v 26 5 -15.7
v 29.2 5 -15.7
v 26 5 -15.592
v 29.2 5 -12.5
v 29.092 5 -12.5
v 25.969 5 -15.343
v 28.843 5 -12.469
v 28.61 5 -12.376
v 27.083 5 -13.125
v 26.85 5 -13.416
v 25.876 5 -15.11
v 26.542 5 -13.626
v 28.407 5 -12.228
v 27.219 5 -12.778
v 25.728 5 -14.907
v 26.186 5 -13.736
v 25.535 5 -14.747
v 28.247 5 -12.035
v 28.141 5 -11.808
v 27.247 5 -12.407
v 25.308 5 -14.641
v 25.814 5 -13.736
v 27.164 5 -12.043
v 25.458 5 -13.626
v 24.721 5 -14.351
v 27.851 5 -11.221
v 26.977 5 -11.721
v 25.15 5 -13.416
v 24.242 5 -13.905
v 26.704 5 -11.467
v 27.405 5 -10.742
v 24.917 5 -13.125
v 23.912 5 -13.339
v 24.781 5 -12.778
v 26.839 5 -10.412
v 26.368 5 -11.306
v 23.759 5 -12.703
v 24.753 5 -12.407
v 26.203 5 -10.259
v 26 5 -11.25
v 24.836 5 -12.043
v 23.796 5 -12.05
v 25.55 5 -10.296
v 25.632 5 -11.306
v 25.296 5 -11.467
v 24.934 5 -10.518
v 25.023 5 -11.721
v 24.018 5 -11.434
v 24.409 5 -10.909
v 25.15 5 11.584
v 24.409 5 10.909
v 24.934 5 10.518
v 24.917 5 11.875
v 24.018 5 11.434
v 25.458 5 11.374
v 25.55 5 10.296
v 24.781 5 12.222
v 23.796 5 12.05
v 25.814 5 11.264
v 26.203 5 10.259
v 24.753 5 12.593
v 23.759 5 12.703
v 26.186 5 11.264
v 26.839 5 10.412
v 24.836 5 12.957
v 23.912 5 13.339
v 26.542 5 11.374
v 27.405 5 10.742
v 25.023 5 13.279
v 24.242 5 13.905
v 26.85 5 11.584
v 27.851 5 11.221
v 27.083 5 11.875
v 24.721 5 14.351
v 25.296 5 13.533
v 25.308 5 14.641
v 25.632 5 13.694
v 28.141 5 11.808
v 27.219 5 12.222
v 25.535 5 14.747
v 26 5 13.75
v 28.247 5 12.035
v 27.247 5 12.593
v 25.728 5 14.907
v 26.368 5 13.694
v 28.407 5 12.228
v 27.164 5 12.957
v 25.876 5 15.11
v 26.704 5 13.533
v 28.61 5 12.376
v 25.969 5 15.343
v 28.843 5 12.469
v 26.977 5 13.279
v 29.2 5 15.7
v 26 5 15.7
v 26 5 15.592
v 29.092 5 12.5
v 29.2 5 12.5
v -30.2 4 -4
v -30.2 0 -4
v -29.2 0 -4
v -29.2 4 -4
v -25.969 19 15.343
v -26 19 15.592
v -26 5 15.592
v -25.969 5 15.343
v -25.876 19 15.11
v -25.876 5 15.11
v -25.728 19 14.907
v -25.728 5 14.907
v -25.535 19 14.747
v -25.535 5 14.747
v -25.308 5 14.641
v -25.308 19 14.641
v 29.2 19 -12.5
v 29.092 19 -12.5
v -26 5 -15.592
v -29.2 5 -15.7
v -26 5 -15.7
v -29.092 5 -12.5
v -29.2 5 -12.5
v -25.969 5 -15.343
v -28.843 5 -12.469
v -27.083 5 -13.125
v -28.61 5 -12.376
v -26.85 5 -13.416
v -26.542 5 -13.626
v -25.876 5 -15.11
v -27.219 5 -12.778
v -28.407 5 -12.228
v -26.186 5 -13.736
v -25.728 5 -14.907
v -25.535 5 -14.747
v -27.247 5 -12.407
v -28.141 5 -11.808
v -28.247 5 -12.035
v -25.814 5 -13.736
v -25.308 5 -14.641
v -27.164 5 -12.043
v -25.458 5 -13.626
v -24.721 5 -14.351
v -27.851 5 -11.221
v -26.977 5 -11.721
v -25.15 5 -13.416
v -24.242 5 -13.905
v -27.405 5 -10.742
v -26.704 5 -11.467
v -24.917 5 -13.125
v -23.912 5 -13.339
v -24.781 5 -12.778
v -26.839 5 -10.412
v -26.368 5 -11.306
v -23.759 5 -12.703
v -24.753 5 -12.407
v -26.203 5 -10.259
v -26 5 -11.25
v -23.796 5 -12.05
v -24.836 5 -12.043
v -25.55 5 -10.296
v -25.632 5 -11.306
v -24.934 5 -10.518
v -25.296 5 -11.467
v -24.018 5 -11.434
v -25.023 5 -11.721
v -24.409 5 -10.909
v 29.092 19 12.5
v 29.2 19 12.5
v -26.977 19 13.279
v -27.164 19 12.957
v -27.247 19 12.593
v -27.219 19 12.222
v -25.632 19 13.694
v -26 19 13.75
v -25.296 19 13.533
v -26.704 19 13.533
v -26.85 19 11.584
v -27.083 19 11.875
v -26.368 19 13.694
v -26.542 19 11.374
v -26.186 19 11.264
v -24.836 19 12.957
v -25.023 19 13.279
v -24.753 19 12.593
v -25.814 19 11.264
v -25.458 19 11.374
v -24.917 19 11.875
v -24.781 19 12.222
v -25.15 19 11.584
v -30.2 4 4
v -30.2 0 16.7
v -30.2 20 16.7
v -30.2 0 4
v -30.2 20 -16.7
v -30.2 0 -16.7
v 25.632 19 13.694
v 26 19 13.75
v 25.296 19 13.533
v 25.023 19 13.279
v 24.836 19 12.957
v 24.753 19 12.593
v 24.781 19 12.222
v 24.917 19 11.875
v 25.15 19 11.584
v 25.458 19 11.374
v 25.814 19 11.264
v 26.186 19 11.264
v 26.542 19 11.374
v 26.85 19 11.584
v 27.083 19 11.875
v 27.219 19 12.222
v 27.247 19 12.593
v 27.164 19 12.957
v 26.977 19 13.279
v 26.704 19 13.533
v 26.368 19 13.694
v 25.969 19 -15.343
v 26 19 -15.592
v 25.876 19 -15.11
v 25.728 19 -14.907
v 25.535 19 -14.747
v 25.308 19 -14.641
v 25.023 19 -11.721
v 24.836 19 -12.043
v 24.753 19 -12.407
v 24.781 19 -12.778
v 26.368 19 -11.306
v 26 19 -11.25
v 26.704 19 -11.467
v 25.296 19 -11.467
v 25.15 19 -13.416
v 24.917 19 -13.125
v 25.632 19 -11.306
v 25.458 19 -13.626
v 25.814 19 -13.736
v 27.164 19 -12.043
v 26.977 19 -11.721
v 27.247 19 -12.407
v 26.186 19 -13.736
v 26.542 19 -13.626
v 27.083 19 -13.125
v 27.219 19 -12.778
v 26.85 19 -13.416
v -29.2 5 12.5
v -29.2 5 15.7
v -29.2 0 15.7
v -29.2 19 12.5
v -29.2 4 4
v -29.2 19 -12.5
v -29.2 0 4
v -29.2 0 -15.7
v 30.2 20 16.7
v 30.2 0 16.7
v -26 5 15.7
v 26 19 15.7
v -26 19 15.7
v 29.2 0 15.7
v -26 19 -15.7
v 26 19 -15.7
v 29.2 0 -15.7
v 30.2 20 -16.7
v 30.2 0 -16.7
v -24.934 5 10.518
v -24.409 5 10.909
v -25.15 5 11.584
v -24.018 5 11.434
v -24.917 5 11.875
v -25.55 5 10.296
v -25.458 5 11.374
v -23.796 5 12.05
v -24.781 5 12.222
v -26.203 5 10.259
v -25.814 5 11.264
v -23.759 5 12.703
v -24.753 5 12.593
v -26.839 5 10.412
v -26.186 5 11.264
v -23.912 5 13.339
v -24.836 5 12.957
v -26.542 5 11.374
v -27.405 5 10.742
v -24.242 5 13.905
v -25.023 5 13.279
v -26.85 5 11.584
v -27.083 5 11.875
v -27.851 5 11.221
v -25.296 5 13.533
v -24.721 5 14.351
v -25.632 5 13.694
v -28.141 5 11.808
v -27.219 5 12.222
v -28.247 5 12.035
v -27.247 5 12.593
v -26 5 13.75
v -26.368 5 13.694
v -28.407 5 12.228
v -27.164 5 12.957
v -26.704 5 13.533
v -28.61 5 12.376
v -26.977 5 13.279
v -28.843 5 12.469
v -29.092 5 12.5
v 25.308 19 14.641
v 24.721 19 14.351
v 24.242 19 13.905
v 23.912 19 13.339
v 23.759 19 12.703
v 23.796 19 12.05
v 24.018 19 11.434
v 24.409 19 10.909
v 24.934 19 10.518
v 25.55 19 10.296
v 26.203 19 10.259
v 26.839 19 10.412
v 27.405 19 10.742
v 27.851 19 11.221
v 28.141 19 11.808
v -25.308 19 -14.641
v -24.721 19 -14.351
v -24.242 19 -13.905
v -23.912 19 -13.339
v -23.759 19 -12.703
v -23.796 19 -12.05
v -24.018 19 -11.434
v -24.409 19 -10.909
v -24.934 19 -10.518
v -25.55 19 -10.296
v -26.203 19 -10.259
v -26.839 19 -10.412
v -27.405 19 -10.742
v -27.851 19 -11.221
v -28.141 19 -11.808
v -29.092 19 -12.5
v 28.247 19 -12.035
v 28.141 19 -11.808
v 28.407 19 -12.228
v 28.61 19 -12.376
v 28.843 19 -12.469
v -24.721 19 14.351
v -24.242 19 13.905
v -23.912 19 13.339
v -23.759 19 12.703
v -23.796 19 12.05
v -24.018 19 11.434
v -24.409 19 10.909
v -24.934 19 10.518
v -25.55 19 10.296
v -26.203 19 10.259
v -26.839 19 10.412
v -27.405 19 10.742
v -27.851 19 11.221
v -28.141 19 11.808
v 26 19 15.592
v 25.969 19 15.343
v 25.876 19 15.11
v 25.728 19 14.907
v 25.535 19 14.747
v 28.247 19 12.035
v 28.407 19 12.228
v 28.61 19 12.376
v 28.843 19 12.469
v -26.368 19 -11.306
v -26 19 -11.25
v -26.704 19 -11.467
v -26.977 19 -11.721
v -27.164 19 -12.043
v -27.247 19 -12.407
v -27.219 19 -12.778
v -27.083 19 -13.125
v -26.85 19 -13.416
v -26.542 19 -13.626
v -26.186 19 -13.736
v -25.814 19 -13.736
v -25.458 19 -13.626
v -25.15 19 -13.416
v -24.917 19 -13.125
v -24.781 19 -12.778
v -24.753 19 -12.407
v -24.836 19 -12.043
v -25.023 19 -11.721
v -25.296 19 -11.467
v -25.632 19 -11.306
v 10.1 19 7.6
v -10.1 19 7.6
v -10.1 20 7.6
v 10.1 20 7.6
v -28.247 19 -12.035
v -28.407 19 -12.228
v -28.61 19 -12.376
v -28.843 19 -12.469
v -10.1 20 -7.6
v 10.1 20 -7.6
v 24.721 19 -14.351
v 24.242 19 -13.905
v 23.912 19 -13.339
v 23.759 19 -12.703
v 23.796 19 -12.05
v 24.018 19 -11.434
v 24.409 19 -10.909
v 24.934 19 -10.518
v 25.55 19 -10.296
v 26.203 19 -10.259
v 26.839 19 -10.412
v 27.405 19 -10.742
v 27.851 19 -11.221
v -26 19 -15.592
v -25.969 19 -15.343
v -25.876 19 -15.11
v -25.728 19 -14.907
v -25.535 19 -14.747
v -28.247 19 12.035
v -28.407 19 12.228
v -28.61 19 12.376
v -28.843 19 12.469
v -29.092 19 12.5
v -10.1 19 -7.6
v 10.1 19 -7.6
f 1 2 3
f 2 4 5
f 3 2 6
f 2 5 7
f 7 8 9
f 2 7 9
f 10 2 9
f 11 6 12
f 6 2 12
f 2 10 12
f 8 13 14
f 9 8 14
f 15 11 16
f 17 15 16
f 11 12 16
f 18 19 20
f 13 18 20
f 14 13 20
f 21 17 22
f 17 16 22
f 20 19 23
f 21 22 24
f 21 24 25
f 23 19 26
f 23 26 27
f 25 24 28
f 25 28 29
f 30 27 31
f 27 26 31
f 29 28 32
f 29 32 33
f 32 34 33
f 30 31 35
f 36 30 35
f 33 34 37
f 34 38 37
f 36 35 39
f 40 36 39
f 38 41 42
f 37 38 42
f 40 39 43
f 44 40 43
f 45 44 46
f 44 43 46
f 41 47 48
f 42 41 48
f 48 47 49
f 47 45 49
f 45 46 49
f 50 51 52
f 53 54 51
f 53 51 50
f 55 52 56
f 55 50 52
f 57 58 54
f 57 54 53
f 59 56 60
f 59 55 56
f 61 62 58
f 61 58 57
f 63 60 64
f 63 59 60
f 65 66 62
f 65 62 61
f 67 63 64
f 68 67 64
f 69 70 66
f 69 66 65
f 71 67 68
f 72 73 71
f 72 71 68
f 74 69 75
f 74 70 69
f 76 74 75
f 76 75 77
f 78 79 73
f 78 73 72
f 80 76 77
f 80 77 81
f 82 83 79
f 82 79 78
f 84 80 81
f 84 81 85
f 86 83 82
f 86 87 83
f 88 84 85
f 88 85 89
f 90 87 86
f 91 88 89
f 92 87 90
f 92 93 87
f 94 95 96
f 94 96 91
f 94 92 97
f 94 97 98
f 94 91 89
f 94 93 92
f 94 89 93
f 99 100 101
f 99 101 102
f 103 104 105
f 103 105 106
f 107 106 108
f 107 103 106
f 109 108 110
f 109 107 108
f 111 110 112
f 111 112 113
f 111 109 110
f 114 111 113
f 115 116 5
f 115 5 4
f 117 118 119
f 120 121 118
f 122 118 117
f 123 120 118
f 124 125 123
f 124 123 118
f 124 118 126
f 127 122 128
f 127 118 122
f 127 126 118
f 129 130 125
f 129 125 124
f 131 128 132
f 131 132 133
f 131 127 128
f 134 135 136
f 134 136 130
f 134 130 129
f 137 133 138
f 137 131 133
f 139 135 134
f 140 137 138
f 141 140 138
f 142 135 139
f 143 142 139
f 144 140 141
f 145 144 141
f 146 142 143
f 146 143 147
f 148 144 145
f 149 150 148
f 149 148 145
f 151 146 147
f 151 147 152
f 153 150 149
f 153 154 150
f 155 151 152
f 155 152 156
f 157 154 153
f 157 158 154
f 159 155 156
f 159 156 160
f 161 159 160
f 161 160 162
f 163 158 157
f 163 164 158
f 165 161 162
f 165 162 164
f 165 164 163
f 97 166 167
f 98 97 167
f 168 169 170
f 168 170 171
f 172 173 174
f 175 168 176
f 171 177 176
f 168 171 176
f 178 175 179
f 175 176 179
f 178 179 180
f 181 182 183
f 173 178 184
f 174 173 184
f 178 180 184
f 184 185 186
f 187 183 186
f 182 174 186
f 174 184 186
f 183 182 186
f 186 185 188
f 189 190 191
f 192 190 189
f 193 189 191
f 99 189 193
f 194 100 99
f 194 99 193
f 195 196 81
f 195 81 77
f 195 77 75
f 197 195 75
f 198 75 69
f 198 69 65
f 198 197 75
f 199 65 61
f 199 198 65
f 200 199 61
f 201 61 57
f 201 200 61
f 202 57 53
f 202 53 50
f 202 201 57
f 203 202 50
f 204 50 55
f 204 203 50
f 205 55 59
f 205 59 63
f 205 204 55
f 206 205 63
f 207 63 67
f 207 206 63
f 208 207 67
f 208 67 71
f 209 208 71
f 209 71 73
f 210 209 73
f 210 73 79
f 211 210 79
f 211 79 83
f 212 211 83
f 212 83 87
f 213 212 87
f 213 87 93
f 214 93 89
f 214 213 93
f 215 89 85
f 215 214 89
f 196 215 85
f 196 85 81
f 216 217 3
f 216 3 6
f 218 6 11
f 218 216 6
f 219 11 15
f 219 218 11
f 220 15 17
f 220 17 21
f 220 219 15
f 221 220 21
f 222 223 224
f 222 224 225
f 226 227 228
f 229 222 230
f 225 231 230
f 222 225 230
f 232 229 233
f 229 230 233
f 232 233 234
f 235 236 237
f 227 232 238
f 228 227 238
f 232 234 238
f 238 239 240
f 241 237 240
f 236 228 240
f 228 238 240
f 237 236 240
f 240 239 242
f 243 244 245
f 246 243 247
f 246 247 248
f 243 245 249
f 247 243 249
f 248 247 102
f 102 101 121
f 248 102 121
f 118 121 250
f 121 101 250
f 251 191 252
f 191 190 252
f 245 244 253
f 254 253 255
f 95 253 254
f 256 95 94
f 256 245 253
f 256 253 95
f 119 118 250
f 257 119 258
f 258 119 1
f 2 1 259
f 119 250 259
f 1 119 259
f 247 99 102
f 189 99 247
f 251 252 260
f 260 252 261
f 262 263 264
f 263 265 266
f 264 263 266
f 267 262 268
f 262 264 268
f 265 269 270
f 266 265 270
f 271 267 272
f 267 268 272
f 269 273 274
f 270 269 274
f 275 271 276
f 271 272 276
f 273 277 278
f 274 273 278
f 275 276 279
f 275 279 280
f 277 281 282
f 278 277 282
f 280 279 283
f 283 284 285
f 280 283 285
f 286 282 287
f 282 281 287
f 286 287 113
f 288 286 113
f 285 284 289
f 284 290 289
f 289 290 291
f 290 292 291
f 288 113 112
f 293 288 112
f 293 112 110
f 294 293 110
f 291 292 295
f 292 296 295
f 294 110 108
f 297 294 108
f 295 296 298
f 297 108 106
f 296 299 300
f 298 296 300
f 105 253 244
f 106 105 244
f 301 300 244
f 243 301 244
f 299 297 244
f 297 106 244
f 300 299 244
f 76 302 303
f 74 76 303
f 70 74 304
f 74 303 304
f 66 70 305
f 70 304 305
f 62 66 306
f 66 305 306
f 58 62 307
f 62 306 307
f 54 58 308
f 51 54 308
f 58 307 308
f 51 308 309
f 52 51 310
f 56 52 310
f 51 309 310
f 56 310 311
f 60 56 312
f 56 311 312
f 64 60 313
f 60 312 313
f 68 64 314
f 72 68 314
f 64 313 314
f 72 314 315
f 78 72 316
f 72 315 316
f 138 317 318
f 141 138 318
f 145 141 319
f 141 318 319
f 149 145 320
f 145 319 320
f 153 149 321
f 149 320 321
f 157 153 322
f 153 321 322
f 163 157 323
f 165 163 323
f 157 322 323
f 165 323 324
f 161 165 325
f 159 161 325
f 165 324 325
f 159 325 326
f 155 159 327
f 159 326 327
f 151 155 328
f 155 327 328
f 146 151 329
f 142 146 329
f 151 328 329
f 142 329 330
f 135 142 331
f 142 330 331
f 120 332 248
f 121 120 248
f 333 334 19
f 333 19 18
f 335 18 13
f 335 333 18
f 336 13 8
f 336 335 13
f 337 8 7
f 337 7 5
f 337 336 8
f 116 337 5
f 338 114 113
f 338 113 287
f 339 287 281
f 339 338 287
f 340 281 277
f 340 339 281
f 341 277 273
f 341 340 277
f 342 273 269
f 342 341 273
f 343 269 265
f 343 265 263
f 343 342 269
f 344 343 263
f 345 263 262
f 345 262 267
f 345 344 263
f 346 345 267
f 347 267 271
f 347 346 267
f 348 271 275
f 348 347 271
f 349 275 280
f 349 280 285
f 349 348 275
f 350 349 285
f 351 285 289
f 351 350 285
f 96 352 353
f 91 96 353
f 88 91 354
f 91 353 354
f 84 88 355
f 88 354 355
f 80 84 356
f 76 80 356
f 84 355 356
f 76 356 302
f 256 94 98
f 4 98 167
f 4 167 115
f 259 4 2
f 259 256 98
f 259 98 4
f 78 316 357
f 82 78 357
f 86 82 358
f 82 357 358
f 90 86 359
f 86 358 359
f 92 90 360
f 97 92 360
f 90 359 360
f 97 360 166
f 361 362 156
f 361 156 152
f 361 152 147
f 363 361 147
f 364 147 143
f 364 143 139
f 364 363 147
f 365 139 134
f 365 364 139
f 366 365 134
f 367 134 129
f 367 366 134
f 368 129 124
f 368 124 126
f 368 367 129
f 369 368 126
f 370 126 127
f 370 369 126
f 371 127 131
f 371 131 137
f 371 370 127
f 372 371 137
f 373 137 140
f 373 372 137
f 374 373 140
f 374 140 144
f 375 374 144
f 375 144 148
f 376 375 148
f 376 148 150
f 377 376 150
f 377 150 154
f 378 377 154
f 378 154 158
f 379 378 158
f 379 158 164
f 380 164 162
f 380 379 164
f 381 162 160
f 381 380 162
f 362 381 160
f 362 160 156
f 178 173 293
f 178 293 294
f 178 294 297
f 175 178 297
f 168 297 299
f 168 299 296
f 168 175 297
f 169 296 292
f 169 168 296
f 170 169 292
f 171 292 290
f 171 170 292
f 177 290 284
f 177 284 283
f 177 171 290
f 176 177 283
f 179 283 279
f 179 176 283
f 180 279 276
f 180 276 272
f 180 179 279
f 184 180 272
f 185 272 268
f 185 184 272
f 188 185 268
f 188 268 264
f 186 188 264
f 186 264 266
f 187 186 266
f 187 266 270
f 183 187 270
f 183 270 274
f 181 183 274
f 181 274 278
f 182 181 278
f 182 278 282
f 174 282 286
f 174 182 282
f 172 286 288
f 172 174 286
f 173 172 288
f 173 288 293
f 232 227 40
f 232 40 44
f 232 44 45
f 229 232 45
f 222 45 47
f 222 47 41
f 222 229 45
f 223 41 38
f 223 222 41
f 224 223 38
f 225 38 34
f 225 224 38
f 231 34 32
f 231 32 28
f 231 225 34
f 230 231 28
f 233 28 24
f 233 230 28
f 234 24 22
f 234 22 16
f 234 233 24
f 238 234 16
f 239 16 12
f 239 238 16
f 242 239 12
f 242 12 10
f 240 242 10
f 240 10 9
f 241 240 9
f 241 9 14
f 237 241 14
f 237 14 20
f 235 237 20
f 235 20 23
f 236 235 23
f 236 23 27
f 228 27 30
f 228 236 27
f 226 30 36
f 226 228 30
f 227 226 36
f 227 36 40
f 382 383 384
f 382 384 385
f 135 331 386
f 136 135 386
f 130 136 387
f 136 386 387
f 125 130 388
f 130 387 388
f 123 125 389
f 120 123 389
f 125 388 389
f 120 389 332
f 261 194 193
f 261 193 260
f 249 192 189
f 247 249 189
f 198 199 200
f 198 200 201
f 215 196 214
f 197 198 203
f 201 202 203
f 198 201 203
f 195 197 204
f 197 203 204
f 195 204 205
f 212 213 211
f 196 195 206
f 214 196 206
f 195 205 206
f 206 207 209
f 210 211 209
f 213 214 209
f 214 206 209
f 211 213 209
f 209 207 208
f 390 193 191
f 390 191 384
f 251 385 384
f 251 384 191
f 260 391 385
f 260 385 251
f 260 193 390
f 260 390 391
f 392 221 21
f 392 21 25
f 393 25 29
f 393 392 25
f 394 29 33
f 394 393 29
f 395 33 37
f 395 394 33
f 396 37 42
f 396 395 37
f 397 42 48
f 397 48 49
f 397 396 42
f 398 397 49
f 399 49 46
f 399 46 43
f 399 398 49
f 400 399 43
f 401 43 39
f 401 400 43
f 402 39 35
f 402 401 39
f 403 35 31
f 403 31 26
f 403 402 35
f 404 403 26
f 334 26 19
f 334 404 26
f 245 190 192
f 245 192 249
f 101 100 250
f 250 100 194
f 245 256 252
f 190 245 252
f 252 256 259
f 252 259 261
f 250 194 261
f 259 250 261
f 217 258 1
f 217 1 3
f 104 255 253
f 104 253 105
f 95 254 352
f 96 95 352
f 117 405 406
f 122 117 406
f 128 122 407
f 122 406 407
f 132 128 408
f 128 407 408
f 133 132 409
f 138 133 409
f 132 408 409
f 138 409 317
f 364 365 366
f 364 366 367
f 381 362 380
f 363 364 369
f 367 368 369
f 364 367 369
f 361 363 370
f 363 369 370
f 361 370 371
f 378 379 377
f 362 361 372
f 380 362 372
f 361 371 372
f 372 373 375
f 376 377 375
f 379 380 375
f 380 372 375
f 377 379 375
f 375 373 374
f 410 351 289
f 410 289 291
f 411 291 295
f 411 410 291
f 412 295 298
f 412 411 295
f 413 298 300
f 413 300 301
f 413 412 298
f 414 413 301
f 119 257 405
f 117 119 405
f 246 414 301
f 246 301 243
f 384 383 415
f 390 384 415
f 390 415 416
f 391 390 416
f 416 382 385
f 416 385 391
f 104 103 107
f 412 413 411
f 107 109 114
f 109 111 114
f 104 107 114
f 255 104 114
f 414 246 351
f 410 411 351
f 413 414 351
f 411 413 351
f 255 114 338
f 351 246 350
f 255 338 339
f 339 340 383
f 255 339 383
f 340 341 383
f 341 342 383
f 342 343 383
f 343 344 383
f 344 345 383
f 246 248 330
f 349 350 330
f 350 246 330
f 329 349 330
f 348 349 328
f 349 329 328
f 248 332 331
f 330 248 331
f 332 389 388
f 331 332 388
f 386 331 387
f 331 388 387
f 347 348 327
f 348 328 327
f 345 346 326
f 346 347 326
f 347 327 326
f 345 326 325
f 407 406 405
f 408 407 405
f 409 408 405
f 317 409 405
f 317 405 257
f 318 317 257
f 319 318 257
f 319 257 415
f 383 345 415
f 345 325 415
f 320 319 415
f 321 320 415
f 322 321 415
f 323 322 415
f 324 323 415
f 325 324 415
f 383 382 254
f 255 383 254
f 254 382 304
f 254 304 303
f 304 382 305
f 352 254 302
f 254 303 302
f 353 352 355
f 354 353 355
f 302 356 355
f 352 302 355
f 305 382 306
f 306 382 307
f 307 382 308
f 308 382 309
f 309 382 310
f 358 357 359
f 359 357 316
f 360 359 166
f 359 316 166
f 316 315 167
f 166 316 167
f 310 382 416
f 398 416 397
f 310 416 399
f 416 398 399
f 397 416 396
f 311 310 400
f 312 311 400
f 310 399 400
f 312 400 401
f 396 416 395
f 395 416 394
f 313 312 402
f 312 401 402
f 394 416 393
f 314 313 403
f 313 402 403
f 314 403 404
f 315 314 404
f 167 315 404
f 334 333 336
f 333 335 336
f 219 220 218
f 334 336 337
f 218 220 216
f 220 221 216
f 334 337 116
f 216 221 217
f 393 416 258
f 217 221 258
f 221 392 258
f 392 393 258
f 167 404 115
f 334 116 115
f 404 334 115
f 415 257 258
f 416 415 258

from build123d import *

# Parameters (mm, degrees)
SKETCH1_W           = 60.4
SKETCH1_H           = 33.4
SKETCH1_W_2         = 58.4
SKETCH1_H_2         = 31.4
BOSS_EXTRUDE1_DEPTH = 19
SKETCH2_W           = 60.4
SKETCH2_H           = 33.4
SKETCH2_W_2         = 20.2
SKETCH2_H_2         = 15.2
BOSS_EXTRUDE2_DEPTH = 1
SKETCH3_R           = 1.25
BOSS_EXTRUDE3_DEPTH = 14
CUT_EXTRUDE1_REACH  = 67.78
SKETCH4_W           = 8
SKETCH4_H           = 4


with BuildPart() as part:
    # Sketch1 → Boss-Extrude1 (new body)
    with BuildSketch(Plane(origin=(0, 0, 0), x_dir=(1, 0, 0), z_dir=(0, 1, 0))):
        Rectangle(SKETCH1_W, SKETCH1_H)
        Rectangle(SKETCH1_W_2, SKETCH1_H_2, mode=Mode.SUBTRACT)
    extrude(amount=BOSS_EXTRUDE1_DEPTH)

    # Sketch2 → Boss-Extrude2 (add)
    with BuildSketch(Plane(origin=(0, 19, 0), x_dir=(1, 0, 0), z_dir=(0, 1, 0))):
        Rectangle(SKETCH2_W, SKETCH2_H)
        Rectangle(SKETCH2_W_2, SKETCH2_H_2, mode=Mode.SUBTRACT)
    extrude(amount=BOSS_EXTRUDE2_DEPTH)

    # Sketch3 → Boss-Extrude3 (add)
    # profile 1 of 4: a face of its own
    with BuildSketch(Plane.XZ.offset(-19)):
        with BuildLine():
            Line((-29.2, 15.7), (-26, 15.7))
            Line((-26, 15.7), (-26, 15.592329219))
            ThreePointArc((-26, 15.592329219), (-25.80860754, 15.003980814), (-25.307692308, 14.640843306))
            ThreePointArc((-25.307692308, 14.640843306), (-24.409009742, 10.909009742), (-28.140843306, 11.807692308))
            ThreePointArc((-28.140843306, 11.807692308), (-28.503980814, 12.30860754), (-29.092329219, 12.5))
            Line((-29.092329219, 12.5), (-29.2, 12.5))
            Line((-29.2, 12.5), (-29.2, 15.7))
        make_face()
        with Locations(Location((-26, 12.5, 0), (0, 0, 90))):
            Circle(SKETCH3_R, mode=Mode.SUBTRACT)
    # profile 2 of 4: a face of its own
    with BuildSketch(Plane.XZ.offset(-19)):
        with BuildLine():
            Line((29.2, 12.5), (29.2, 15.7))
            Line((29.2, 15.7), (26, 15.7))
            Line((26, 15.7), (26, 15.592329219))
            ThreePointArc((26, 15.592329219), (25.80860754, 15.003980814), (25.307692308, 14.640843306))
            ThreePointArc((25.307692308, 14.640843306), (24.409009742, 10.909009742), (28.140843306, 11.807692308))
            ThreePointArc((28.140843306, 11.807692308), (28.503980814, 12.30860754), (29.092329219, 12.5))
            Line((29.092329219, 12.5), (29.2, 12.5))
        make_face()
        with Locations(Location((26, 12.5, 0), (0, 0, 90))):
            Circle(SKETCH3_R, mode=Mode.SUBTRACT)
    # profile 3 of 4: a face of its own
    with BuildSketch(Plane.XZ.offset(-19)):
        with BuildLine():
            Line((29.2, -15.7), (26, -15.7))
            Line((26, -15.7), (26, -15.592329219))
            ThreePointArc((26, -15.592329219), (25.80860754, -15.003980814), (25.307692308, -14.640843306))
            ThreePointArc((25.307692308, -14.640843306), (24.409009742, -10.909009742), (28.140843306, -11.807692308))
            ThreePointArc((28.140843306, -11.807692308), (28.503980814, -12.30860754), (29.092329219, -12.5))
            Line((29.092329219, -12.5), (29.2, -12.5))
            Line((29.2, -12.5), (29.2, -15.7))
        make_face()
        with Locations(Location((26, -12.5, 0), (0, 0, 90))):
            Circle(SKETCH3_R, mode=Mode.SUBTRACT)
    # profile 4 of 4: a face of its own
    with BuildSketch(Plane.XZ.offset(-19)):
        with BuildLine():
            Line((-29.2, -12.5), (-29.2, -15.7))
            Line((-29.2, -15.7), (-26, -15.7))
            Line((-26, -15.7), (-26, -15.592329219))
            ThreePointArc((-26, -15.592329219), (-25.80860754, -15.003980814), (-25.307692308, -14.640843306))
            ThreePointArc((-25.307692308, -14.640843306), (-24.409009742, -10.909009742), (-28.140843306, -11.807692308))
            ThreePointArc((-28.140843306, -11.807692308), (-28.503980814, -12.30860754), (-29.092329219, -12.5))
            Line((-29.092329219, -12.5), (-29.2, -12.5))
        make_face()
        with Locations(Location((-26, -12.5, 0), (0, 0, 90))):
            Circle(SKETCH3_R, mode=Mode.SUBTRACT)
    extrude(amount=BOSS_EXTRUDE3_DEPTH)

    # Sketch4 → Cut-Extrude1 (cut, up to next)
    with BuildSketch(Plane.ZY.offset(30.2), mode=Mode.PRIVATE) as cut_extrude1_sk1:
        with Locations((0, 2)):
            Rectangle(SKETCH4_W, SKETCH4_H)
    cut_extrude1_tool1 = extrude(cut_extrude1_sk1.sketch, amount=-CUT_EXTRUDE1_REACH, mode=Mode.PRIVATE) & part.part
    add(cut_extrude1_tool1.solids().sort_by_distance((-30.2, 2, 0))[0], mode=Mode.SUBTRACT)


solid = part.part
